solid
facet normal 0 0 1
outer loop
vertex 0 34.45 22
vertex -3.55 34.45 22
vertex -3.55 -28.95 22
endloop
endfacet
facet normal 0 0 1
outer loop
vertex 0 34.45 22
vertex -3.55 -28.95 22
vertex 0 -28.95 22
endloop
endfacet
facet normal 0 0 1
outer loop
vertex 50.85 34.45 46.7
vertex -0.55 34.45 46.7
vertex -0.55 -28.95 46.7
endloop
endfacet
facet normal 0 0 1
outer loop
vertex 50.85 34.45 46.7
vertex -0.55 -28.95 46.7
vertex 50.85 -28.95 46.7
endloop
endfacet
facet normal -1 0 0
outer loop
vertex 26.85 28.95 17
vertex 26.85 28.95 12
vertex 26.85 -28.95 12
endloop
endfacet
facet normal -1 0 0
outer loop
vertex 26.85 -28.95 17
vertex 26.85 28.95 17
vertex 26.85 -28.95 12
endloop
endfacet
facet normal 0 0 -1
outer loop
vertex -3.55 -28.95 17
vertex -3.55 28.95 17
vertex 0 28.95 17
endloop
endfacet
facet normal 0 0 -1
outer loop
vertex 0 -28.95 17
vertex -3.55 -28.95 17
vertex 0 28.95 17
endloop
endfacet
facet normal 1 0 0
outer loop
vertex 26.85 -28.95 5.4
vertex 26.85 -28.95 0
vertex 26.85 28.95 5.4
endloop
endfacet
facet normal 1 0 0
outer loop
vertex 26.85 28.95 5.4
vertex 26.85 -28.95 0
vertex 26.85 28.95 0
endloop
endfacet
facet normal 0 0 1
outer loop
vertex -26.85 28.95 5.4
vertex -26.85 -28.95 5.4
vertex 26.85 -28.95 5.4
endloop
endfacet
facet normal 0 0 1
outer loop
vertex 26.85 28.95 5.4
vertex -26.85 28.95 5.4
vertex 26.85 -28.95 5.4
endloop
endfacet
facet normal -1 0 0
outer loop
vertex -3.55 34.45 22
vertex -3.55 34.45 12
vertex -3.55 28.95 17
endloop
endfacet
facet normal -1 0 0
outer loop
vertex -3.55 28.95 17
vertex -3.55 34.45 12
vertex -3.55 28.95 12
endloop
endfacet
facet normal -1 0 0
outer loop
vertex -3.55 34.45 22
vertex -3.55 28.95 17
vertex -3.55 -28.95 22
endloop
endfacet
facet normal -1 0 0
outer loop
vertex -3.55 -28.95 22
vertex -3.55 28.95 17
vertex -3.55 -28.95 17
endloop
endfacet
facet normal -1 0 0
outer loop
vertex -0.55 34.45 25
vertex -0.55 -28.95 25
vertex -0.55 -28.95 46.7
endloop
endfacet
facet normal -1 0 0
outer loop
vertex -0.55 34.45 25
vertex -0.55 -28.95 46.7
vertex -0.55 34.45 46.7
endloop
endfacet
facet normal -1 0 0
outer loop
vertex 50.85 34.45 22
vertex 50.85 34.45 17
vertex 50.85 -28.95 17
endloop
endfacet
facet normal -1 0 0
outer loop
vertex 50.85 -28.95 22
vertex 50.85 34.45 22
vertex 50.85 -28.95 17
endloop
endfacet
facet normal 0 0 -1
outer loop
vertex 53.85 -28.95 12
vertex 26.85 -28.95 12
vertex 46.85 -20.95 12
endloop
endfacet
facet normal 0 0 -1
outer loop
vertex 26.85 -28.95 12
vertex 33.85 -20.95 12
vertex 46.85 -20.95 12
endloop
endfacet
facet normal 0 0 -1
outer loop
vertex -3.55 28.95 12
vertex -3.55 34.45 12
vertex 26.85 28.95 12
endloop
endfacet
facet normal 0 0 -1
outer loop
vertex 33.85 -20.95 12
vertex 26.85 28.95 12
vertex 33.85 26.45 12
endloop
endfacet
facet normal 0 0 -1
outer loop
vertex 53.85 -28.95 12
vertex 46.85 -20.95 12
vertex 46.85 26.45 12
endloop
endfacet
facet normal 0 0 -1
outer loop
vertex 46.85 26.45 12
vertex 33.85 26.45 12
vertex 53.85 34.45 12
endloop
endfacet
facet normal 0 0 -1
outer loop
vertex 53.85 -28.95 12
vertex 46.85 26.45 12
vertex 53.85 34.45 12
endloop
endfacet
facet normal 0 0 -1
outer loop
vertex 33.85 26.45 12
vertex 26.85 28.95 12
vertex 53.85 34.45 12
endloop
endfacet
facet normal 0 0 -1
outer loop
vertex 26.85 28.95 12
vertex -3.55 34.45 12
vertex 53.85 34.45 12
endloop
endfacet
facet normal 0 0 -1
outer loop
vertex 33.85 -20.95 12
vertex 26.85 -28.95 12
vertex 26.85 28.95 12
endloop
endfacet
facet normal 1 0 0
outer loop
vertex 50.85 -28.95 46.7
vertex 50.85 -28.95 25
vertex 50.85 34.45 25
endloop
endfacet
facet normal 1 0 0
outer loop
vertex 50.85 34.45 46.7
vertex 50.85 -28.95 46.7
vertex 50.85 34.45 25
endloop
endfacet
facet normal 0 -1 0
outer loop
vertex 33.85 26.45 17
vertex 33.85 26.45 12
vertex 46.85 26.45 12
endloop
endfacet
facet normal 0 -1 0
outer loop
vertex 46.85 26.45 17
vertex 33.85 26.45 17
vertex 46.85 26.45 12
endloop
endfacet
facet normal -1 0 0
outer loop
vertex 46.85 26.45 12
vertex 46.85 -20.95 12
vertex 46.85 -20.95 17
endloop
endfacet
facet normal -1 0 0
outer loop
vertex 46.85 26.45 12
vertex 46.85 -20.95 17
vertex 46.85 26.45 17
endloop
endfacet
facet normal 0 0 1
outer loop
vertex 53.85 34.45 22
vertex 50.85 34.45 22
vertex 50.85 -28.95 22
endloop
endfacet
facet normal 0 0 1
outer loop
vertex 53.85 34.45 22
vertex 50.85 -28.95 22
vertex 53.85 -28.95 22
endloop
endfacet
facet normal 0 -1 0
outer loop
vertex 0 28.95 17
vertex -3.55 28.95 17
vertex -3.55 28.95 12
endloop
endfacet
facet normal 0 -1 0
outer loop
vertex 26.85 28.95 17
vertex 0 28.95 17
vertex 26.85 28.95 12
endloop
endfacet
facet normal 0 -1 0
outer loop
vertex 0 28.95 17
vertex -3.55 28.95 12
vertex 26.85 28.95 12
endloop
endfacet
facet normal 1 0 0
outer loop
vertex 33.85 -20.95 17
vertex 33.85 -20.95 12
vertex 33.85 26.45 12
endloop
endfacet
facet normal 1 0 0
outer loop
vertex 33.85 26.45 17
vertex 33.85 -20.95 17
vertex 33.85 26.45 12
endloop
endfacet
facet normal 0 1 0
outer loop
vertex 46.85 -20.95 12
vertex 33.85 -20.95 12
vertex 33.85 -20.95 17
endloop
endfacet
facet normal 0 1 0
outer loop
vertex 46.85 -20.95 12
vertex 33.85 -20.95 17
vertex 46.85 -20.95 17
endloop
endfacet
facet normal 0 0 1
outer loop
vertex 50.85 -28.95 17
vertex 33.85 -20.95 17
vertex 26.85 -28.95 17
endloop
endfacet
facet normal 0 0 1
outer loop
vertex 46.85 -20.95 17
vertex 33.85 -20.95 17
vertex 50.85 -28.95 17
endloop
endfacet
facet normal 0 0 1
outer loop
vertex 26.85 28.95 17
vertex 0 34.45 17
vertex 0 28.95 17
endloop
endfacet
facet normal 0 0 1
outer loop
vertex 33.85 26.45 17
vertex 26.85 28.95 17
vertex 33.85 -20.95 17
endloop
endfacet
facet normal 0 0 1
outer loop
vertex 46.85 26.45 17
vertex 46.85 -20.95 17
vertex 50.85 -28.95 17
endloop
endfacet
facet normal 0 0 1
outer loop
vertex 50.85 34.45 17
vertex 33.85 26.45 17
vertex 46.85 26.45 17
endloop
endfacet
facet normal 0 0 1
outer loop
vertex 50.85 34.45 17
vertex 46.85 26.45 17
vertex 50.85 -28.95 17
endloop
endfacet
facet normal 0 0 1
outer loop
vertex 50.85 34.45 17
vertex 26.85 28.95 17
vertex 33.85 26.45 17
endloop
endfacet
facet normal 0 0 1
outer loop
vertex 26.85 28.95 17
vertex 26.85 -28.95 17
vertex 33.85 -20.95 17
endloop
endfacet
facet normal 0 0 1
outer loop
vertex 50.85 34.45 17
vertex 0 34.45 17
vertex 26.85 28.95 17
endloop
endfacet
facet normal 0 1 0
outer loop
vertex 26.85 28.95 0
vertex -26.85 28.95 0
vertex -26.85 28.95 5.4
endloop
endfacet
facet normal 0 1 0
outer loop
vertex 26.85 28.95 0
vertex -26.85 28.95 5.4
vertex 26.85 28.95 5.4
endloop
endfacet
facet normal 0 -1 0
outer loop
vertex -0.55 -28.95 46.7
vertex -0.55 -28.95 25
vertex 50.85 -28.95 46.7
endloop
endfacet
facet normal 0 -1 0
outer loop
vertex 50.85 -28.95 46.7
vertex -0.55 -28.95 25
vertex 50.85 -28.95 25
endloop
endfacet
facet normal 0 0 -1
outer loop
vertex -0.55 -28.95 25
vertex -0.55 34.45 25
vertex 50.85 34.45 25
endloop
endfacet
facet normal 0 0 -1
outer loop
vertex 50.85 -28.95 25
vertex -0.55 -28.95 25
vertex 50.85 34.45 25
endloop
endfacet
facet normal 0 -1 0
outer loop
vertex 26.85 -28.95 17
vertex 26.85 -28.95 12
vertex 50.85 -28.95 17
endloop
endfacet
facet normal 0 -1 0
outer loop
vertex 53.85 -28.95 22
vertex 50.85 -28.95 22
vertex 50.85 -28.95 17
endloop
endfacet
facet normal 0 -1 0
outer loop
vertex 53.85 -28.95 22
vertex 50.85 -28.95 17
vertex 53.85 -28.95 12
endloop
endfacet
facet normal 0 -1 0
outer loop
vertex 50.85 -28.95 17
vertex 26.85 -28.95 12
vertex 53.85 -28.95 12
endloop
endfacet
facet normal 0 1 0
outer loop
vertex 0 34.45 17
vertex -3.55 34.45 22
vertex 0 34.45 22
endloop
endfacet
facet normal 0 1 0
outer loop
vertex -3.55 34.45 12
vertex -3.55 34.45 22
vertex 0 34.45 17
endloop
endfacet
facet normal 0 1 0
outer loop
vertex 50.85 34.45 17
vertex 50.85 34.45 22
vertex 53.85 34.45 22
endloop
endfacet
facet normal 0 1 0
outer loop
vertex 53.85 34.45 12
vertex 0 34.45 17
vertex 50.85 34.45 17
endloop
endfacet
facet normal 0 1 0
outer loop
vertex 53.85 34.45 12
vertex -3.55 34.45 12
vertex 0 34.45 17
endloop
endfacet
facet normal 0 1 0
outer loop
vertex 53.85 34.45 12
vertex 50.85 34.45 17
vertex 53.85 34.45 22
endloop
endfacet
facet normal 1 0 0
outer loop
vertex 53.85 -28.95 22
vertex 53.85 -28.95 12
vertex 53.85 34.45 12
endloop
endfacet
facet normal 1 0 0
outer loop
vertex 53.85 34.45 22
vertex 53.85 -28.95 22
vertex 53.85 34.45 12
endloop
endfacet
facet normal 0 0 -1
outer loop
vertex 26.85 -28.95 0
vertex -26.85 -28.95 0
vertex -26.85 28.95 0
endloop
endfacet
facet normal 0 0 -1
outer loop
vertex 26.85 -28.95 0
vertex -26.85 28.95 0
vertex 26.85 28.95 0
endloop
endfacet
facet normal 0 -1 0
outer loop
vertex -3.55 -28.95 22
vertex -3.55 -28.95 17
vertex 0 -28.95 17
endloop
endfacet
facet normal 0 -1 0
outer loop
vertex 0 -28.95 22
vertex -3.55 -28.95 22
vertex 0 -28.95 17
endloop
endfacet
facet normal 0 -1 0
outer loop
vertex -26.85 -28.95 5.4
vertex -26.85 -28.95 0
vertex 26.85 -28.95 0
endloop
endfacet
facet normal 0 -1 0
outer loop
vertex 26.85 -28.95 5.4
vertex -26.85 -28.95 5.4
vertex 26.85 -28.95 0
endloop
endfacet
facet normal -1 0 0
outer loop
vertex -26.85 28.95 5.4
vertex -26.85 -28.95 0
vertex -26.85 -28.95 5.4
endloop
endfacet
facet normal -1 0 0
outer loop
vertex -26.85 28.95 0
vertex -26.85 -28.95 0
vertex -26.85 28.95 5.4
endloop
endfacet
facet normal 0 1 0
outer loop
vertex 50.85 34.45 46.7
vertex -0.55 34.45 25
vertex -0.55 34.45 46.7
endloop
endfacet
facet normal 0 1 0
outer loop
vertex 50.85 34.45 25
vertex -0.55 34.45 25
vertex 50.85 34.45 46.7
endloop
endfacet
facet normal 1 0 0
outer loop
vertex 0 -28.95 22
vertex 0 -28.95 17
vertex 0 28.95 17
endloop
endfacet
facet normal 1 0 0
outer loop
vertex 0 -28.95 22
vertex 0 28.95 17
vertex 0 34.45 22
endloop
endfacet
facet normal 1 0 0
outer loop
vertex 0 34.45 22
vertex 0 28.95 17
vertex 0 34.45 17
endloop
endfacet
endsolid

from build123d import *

# Parameters (mm, degrees)
F0_W      = 53.7
F0_H      = 57.9
F1_DEPTH  = 5.4
F3_W      = 51.4
F3_H      = 63.4
F4_DEPTH  = 21.7
F6_W      = 24
F6_H      = 4
F6_W_2    = 3
F6_H_2    = 53.9
F6_W_3    = 13
F6_H_3    = 47.4
F6_H_4    = 5.5
F7_DEPTH  = 5
F8_DEPTH  = 10
F10_W     = 3.55
F10_H     = 57.9
F10_H_2   = 5.5
F11_DEPTH = 5


with BuildPart() as f1:
    # F0 (on Top) → F1 (new body)
    with BuildSketch(Plane.XY):
        Rectangle(F0_W, F0_H)
    extrude(amount=F1_DEPTH)


with BuildPart() as f4:
    # F3 (on offset) → F4 (new body)
    with BuildSketch(Plane.XY.offset(25)):
        with Locations((25.15, 2.75)):
            Rectangle(F3_W, F3_H)
    extrude(amount=F4_DEPTH)


with BuildPart() as f7:
    # F6 (on offset) → F7 (new body)
    with BuildSketch(Plane.XY.offset(12)):
        Polygon((-0.55, 28.95), (26.85, 28.95), (50.85, 28.95), (50.85, 34.45), (-0.55, 34.45), align=None)
        with Locations((38.85, -26.95)):
            Rectangle(F6_W, F6_H)
        with Locations((52.35, -26.95)):
            Rectangle(F6_W_2, F6_H)
        with Locations((38.85, 2)):
            Rectangle(F6_W, F6_H_2)
        with Locations((40.35, 2.75)):
            Rectangle(F6_W_3, F6_H_3, mode=Mode.SUBTRACT)
        with Locations((-2.05, 31.7)):
            Rectangle(F6_W_2, F6_H_4)
        Polygon((50.85, 34.45), (50.85, 28.95), (50.85, -24.95), (53.85, -24.95), (53.85, 34.45), align=None)
    extrude(amount=F7_DEPTH)

    # F6 (on offset) → F8 (join)
    with BuildSketch(Plane.XY.offset(12)):
        Polygon((50.85, 34.45), (50.85, 28.95), (50.85, -24.95), (53.85, -24.95), (53.85, 34.45), align=None)
        with Locations((52.35, -26.95)):
            Rectangle(F6_W_2, F6_H)
        with Locations((-2.05, 31.7)):
            Rectangle(F6_W_2, F6_H_4)
    extrude(amount=F8_DEPTH)

    # F10 (on offset) → F11 (join)
    with BuildSketch(Plane.XY.offset(17)):
        with Locations((-1.775, 0)):
            Rectangle(F10_W, F10_H)
        with Locations((-1.775, 31.7)):
            Rectangle(F10_W, F10_H_2)
    extrude(amount=F11_DEPTH)


solid = Compound([f1.part, f4.part, f7.part])
